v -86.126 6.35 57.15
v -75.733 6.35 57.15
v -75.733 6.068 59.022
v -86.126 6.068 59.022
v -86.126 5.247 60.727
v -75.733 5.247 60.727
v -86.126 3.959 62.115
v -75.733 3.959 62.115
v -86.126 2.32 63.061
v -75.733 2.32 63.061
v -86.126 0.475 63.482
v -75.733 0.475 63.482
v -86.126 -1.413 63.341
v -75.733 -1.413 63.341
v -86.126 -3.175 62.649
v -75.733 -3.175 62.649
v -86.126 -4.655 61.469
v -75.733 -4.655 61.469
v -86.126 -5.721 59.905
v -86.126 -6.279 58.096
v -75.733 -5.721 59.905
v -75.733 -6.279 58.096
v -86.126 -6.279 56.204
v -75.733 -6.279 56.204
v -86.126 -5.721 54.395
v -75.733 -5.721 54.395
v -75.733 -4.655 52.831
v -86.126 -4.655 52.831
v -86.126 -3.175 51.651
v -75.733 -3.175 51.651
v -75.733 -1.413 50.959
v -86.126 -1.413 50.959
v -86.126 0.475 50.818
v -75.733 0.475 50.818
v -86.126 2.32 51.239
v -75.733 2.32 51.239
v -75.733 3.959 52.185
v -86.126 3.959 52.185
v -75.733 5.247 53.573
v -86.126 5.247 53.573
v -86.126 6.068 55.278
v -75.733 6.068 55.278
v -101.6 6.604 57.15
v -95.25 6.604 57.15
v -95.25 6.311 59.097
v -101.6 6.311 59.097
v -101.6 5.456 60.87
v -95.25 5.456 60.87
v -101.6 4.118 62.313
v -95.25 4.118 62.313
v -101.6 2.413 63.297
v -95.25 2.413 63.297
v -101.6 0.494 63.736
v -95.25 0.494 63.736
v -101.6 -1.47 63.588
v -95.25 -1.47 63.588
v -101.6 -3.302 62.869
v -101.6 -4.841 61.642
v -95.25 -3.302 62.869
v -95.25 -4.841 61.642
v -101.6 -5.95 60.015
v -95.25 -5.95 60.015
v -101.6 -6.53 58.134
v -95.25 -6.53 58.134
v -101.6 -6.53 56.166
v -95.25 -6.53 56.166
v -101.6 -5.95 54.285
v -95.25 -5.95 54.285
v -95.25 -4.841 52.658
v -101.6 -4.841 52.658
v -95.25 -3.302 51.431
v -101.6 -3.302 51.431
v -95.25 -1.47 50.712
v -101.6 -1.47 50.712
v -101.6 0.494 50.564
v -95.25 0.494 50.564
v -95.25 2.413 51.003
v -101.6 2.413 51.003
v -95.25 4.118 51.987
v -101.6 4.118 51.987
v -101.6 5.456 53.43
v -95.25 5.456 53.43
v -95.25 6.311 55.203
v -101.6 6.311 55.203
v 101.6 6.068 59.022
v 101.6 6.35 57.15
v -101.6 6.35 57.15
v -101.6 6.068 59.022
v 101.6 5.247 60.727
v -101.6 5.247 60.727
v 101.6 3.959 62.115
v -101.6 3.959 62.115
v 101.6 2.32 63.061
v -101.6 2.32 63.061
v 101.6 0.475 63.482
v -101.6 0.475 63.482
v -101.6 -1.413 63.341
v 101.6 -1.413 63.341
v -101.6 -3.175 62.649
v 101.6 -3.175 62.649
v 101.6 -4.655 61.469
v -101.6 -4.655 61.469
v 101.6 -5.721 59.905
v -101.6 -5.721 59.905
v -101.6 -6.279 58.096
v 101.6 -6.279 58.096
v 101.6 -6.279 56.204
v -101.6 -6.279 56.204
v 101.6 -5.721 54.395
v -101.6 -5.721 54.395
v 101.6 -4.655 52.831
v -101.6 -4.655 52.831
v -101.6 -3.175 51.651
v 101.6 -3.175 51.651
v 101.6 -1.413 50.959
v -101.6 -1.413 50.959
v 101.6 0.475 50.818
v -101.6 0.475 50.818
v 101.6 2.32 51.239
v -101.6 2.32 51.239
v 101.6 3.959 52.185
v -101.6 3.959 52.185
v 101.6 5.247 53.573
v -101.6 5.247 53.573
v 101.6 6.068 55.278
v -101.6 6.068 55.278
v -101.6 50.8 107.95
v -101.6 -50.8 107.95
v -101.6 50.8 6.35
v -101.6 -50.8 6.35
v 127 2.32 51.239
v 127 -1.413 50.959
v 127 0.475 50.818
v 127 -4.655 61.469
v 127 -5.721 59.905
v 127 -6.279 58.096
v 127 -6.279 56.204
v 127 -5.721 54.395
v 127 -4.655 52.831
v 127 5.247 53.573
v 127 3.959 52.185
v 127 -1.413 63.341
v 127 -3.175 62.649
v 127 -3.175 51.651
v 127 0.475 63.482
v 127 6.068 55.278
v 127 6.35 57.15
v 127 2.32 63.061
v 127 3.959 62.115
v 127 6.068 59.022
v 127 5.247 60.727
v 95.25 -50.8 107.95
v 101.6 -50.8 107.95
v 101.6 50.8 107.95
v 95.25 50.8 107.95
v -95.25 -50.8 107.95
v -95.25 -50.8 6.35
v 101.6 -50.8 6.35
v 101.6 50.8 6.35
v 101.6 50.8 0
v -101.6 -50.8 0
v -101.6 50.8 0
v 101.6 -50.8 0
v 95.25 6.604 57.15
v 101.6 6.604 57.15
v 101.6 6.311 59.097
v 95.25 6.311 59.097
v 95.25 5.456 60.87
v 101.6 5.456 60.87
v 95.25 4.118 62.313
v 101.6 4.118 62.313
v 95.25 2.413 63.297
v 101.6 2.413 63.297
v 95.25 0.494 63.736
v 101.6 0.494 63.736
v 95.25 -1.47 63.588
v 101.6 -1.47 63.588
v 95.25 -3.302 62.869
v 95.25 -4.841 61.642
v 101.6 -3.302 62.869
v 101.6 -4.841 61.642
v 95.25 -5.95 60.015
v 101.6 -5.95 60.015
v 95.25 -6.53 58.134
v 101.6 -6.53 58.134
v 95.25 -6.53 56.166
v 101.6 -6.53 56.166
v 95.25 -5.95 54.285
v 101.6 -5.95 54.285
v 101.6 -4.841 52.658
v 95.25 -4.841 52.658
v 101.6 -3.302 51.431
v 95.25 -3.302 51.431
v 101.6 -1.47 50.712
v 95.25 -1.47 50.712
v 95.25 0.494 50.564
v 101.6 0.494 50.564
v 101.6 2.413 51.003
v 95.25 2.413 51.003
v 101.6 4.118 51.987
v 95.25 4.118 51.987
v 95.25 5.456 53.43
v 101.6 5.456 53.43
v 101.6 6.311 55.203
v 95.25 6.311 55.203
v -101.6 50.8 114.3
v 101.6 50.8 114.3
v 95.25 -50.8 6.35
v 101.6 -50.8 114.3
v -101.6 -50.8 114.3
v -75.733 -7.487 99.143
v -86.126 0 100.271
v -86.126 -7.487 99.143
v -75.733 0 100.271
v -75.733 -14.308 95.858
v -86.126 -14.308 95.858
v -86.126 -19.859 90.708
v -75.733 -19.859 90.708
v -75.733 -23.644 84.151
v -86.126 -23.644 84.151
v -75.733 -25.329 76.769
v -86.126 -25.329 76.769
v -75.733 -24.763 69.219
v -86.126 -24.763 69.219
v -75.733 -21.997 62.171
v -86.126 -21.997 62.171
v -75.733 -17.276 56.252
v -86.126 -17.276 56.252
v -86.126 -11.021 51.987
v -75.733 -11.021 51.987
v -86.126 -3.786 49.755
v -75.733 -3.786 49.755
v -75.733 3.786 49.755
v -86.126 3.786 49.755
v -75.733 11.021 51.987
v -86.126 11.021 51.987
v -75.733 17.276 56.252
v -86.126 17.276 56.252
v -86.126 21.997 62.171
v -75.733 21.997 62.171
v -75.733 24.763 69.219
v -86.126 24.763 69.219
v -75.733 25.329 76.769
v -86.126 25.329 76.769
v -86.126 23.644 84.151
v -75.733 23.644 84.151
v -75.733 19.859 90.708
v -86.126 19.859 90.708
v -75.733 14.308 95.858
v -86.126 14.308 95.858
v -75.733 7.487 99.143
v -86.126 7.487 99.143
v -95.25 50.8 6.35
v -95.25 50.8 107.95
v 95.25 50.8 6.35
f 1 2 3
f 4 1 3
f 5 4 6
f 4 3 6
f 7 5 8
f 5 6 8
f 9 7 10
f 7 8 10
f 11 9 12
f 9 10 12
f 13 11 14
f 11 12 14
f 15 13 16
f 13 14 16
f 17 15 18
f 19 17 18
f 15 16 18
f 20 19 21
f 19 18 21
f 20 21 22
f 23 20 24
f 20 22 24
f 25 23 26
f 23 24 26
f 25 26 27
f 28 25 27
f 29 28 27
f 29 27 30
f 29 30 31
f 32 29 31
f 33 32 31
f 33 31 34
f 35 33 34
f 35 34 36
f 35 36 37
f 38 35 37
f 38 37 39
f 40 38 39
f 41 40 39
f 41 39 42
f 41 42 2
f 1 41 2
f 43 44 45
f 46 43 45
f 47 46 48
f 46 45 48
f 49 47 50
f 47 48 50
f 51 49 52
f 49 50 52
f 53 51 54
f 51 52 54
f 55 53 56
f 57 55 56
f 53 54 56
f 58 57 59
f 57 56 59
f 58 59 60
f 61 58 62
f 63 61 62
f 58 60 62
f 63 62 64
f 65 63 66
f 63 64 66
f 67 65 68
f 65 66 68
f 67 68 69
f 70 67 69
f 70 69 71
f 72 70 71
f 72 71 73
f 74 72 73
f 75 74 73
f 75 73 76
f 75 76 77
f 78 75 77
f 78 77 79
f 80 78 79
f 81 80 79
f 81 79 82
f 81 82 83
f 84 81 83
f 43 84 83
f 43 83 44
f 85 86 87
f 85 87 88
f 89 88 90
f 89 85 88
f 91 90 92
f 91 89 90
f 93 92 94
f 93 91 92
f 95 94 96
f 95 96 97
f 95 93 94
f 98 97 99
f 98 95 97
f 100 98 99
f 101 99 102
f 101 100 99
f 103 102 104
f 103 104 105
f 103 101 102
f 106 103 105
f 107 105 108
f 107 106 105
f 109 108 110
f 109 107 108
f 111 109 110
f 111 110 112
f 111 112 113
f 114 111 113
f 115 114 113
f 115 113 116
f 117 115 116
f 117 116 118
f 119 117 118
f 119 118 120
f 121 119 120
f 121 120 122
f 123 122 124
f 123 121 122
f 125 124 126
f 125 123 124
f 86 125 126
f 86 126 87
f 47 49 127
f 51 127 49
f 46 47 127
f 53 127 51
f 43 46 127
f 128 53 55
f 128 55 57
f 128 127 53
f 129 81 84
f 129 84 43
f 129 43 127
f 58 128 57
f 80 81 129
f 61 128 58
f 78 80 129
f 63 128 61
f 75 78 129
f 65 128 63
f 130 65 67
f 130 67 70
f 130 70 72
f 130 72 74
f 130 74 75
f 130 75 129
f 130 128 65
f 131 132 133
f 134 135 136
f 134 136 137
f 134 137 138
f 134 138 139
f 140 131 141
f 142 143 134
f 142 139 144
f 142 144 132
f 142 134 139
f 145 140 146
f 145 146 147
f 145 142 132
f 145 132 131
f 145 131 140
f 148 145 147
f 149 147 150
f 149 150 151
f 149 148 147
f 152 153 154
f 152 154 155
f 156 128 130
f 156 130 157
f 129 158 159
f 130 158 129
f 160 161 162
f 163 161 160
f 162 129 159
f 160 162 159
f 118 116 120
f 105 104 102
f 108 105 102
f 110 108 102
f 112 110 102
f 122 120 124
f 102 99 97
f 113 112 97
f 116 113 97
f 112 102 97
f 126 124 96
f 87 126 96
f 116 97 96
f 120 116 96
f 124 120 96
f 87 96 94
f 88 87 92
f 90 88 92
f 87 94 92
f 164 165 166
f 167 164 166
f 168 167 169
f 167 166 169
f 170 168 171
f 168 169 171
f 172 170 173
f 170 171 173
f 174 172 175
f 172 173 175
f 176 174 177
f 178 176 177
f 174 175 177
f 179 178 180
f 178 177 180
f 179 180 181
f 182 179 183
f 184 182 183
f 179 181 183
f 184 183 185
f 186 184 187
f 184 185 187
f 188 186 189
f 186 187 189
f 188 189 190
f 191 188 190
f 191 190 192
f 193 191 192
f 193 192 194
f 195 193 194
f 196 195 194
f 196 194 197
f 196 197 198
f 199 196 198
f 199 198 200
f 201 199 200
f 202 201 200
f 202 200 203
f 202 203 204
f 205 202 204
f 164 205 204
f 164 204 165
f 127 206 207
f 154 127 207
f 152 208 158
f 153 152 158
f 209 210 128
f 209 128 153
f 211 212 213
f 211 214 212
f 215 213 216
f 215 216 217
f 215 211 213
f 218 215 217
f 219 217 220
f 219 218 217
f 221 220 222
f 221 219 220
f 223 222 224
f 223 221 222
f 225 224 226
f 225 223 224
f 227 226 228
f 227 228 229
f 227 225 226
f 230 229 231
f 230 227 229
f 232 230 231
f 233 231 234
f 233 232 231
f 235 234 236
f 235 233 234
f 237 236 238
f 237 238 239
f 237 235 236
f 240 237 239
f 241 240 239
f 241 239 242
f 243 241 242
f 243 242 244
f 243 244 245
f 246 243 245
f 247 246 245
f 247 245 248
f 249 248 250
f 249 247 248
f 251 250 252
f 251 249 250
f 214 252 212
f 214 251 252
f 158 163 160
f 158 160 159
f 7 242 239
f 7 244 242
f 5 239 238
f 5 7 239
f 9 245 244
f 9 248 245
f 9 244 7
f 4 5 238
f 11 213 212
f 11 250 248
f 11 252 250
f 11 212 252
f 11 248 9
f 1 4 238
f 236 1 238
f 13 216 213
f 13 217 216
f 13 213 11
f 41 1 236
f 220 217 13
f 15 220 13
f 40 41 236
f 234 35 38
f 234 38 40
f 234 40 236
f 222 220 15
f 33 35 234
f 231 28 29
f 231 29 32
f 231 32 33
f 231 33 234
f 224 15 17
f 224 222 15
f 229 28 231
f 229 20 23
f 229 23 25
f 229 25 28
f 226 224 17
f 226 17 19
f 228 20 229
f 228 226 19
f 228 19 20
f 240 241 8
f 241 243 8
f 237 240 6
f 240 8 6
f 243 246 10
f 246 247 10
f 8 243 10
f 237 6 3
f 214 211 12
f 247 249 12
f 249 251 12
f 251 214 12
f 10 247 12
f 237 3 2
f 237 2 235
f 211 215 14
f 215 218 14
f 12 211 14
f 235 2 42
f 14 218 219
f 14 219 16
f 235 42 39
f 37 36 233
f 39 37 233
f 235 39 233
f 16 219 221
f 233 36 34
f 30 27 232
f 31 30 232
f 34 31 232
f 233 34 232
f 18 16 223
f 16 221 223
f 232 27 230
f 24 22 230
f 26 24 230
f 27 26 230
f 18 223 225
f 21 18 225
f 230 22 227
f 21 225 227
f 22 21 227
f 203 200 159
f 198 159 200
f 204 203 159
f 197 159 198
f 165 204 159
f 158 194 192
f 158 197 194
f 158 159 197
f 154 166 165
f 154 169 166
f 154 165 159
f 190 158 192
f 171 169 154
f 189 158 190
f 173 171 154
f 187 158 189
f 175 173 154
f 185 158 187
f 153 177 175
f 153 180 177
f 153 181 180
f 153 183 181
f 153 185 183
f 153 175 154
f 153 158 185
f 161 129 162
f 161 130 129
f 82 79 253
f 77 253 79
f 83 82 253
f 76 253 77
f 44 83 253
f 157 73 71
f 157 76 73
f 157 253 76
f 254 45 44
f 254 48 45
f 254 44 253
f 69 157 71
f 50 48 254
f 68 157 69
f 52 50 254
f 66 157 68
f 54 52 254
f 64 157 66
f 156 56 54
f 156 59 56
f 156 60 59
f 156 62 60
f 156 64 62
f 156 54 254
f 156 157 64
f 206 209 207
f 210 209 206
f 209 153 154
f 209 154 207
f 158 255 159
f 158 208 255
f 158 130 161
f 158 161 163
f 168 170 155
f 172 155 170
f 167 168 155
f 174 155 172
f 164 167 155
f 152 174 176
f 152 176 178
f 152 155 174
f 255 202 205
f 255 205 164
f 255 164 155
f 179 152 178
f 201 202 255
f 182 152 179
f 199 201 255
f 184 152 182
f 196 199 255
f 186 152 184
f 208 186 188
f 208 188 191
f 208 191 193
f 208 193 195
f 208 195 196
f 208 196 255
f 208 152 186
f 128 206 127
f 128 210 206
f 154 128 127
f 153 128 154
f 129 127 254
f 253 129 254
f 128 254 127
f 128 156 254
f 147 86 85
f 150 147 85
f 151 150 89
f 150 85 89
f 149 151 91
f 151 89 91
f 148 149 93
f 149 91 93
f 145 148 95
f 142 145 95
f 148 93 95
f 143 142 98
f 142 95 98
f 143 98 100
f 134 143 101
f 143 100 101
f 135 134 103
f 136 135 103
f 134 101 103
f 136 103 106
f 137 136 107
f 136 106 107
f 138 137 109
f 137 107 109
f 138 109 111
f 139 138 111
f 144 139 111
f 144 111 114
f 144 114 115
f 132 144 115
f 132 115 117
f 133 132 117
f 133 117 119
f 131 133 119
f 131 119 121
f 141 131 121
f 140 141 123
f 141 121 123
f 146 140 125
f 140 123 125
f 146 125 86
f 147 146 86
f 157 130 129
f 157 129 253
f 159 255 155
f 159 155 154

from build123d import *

# Parameters (mm, degrees)
F1_DEPTH      = 50.8
F2_DEPTH      = 50.8
F2_DEPTH_BACK = 50.8
F0_W          = 10.3929936886
F0_H          = 25.4
F4_R          = 6.604
F4_R_2        = 6.35
F5_DEPTH      = 203.201
F6_DEPTH      = 203.2
F6_DEPTH_BACK = 25.4


with BuildPart() as f1:
    # F0 (on Front) → F1 (new body, symmetric)
    with BuildSketch(Plane.XZ):
        Polygon((-101.6, 114.3), (-101.6, 107.95), (-95.25, 107.95), (95.25, 107.95), (101.6, 107.95), (101.6, 114.3), align=None)
    extrude(amount=F1_DEPTH, both=True)


with BuildPart() as f1b:
    # F0 (on Front) → F1, piece 2 (new body, symmetric)
    with BuildSketch(Plane.XZ):
        Polygon((-101.6, 6.35), (-101.6, 0), (101.6, 0), (101.6, 6.35), (95.25, 6.35), (-95.25, 6.35), align=None)
    extrude(amount=F1_DEPTH, both=True)


with BuildPart() as f2:
    # F0 (on Front) → F2 (new body, two sides)
    with BuildSketch(Plane.XZ) as f2_sk:
        Polygon((-101.6, 107.95), (-101.6, 6.35), (-95.25, 6.35), (-95.25, 57.15), (-95.25, 107.95), align=None)
    extrude(amount=F2_DEPTH)
    extrude(f2_sk.sketch, amount=-F2_DEPTH_BACK)


with BuildPart() as f2b:
    # F0 (on Front) → F2, piece 2 (new body, two sides)
    with BuildSketch(Plane.XZ) as f2_2_sk:
        Polygon((95.25, 6.35), (101.6, 6.35), (101.6, 107.95), (95.25, 107.95), (95.25, 57.15), align=None)
    extrude(amount=F2_DEPTH)
    extrude(f2_2_sk.sketch, amount=-F2_DEPTH_BACK)


with BuildPart() as f3:
    # F0 (on Front) → F3 (revolve)
    with BuildSketch(Plane.XZ):
        with Locations((-80.9298753738, 87.5712479413)):
            Rectangle(F0_W, F0_H)
    revolve(axis=Axis((-80.9298753738, 0, 74.8712479413), (1, 0, 0)))


with BuildPart() as f5_tool:
    # F4 (on face) → F5 (new body, through all)
    with BuildSketch(Plane.YZ.offset(101.6)):
        with Locations((0, 57.15)):
            Circle(F4_R)
        with Locations((0, 57.15)):
            Circle(F4_R_2, mode=Mode.SUBTRACT)
        with Locations((0, 57.15)):
            Circle(F4_R_2)
    extrude(amount=-F5_DEPTH)


with BuildPart() as f2_1:
    add(f2.part)

    # F5: cut by f5_tool
    add(f5_tool.part, mode=Mode.SUBTRACT)


with BuildPart() as f2b_1:
    add(f2b.part)

    # F5: cut by f5_tool
    add(f5_tool.part, mode=Mode.SUBTRACT)


with BuildPart() as f6:
    # F4 (on face) → F6 (new body, two sides)
    with BuildSketch(Plane.YZ.offset(101.6)) as f6_sk:
        with Locations((0, 57.15)):
            Circle(F4_R_2)
    extrude(amount=-F6_DEPTH)
    extrude(f6_sk.sketch, amount=F6_DEPTH_BACK)


with BuildPart() as f3_1:
    add(f3.part)

    # F7: cut F6
    add(f6.part, mode=Mode.SUBTRACT)


solid = Compound([f1.part, f1b.part, f2_1.part, f2b_1.part, f6.part, f3_1.part])
